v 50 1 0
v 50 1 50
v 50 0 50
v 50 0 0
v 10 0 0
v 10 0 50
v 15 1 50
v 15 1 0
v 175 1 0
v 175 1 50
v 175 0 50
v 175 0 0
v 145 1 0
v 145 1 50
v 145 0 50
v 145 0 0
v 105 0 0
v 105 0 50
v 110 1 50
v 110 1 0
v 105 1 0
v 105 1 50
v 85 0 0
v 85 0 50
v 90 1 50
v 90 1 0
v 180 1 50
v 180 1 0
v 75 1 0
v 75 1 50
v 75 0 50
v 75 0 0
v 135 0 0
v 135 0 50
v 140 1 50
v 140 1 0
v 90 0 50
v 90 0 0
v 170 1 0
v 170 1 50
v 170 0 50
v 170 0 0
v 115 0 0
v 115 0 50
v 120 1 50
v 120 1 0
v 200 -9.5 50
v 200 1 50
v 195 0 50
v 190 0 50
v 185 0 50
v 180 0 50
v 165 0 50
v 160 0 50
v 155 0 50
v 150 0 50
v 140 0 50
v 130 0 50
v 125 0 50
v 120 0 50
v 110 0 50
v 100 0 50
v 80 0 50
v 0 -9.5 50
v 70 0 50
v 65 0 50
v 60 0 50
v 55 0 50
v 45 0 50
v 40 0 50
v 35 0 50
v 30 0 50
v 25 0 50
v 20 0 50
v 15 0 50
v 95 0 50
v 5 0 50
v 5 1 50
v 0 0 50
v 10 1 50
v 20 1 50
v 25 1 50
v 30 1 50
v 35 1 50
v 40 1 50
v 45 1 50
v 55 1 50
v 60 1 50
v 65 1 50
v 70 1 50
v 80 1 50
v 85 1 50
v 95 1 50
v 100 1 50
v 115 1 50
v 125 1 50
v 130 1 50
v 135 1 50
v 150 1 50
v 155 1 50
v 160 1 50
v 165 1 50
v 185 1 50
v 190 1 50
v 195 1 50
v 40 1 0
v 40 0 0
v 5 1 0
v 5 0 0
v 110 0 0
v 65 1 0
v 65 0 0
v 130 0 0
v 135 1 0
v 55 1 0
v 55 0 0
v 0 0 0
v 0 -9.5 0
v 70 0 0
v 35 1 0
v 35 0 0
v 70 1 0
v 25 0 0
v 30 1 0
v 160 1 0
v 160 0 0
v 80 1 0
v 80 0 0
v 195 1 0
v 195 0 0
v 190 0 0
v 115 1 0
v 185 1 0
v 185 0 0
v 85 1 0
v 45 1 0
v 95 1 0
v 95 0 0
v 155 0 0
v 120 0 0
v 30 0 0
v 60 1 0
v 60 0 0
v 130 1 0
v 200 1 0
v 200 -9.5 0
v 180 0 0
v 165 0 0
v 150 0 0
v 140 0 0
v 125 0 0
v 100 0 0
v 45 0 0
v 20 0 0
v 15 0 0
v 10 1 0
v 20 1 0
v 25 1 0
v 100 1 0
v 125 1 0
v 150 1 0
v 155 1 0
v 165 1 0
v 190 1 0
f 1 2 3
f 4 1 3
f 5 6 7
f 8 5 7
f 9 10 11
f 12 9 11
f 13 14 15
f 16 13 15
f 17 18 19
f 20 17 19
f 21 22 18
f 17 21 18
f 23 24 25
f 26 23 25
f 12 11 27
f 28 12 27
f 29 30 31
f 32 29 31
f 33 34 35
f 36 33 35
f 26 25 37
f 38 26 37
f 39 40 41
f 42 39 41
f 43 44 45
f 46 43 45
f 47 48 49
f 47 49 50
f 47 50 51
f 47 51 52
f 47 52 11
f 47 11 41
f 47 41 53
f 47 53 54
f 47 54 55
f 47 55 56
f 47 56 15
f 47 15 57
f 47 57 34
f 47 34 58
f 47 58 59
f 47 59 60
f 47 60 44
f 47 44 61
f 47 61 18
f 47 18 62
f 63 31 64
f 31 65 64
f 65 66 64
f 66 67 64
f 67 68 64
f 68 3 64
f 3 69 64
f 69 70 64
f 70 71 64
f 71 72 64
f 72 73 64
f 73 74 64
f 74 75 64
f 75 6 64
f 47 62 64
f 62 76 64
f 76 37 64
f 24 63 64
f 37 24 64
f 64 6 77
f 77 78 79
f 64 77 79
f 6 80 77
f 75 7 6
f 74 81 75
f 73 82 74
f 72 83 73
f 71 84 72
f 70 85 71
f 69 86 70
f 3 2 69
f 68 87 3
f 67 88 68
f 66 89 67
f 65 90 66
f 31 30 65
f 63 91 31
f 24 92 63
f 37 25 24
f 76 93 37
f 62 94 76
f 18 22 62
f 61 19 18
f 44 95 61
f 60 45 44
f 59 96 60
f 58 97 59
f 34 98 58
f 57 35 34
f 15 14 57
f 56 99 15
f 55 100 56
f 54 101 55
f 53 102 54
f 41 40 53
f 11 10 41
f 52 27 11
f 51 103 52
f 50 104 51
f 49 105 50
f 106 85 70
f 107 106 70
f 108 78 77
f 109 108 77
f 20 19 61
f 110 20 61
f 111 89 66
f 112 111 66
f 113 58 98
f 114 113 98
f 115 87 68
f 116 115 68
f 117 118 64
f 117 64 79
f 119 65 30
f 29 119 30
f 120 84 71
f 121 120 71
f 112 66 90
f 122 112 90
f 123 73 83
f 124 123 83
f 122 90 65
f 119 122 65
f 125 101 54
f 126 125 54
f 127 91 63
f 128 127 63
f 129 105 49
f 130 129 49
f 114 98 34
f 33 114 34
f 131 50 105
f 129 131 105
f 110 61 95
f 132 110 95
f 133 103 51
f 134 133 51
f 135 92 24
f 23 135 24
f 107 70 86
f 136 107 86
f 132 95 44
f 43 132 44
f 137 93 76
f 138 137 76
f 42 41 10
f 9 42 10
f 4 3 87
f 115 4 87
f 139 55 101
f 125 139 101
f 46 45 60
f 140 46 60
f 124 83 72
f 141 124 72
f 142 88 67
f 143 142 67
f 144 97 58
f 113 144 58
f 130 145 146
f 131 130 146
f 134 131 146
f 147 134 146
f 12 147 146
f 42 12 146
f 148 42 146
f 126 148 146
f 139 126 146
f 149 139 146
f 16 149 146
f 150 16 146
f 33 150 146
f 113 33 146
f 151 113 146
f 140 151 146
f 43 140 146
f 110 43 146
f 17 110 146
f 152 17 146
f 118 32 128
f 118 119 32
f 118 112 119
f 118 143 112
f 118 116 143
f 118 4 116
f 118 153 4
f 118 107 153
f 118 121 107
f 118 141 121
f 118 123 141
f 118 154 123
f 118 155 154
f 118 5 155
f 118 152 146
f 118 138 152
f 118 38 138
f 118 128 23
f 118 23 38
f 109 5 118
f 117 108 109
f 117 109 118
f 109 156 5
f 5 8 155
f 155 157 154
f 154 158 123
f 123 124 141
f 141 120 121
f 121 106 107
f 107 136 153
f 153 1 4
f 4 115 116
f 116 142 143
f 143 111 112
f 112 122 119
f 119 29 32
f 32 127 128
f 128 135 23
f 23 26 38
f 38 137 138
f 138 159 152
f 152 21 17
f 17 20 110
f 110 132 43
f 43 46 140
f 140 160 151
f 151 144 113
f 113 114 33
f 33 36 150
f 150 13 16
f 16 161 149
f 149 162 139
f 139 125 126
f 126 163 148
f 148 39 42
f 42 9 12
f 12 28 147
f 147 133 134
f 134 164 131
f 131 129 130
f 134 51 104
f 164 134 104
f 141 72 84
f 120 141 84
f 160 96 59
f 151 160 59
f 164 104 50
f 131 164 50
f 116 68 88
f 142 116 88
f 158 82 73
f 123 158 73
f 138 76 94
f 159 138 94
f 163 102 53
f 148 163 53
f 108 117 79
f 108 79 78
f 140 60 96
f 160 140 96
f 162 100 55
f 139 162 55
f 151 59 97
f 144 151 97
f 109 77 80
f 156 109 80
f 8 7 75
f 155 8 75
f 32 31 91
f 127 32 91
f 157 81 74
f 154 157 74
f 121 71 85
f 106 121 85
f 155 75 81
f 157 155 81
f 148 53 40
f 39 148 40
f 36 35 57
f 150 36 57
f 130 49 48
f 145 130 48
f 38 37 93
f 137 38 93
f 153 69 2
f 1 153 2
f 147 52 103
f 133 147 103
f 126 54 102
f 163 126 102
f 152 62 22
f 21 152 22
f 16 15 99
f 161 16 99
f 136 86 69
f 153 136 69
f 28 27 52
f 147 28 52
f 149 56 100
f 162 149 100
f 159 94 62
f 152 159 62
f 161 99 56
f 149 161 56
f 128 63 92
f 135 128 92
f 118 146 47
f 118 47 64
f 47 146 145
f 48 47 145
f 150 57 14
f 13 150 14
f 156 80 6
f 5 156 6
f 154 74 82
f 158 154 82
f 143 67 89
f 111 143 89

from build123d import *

# Parameters (mm, degrees)
AUFSATZ_LINEAR_AUSTRAGEN1_DEPTH = 50


with BuildPart() as part:
    # Skizze1 → Aufsatz-Linear austragen1 (new body)
    with BuildSketch(Plane.XY):
        Polygon((200, -9.5), (0, -9.5), (0, 0), (5, 1), (5, 0), (10, 1), (10, 0), (15, 1), (15, 0), (20, 1), (20, 0), (25, 1), (25, 0), (30, 1), (30, 0), (35, 1), (35, 0), (40, 1), (40, 0), (45, 1), (45, 0), (50, 1), (50, 0), (55, 1), (55, 0), (60, 1), (60, 0), (65, 1), (65, 0), (70, 1), (70, 0), (75, 1), (75, 0), (80, 1), (80, 0), (85, 1), (85, 0), (90, 1), (90, 0), (95, 1), (95, 0), (100, 1), (100, 0), (105, 1), (105, 0), (110, 1), (110, 0), (115, 1), (115, 0), (120, 1), (120, 0), (125, 1), (125, 0), (130, 1), (130, 0), (135, 1), (135, 0), (140, 1), (140, 0), (145, 1), (145, 0), (150, 1), (150, 0), (155, 1), (155, 0), (160, 1), (160, 0), (165, 1), (165, 0), (170, 1), (170, 0), (175, 1), (175, 0), (180, 1), (180, 0), (185, 1), (185, 0), (190, 1), (190, 0), (195, 1), (195, 0), (200, 1), (200, 0), align=None)
    extrude(amount=AUFSATZ_LINEAR_AUSTRAGEN1_DEPTH)


solid = part.part
